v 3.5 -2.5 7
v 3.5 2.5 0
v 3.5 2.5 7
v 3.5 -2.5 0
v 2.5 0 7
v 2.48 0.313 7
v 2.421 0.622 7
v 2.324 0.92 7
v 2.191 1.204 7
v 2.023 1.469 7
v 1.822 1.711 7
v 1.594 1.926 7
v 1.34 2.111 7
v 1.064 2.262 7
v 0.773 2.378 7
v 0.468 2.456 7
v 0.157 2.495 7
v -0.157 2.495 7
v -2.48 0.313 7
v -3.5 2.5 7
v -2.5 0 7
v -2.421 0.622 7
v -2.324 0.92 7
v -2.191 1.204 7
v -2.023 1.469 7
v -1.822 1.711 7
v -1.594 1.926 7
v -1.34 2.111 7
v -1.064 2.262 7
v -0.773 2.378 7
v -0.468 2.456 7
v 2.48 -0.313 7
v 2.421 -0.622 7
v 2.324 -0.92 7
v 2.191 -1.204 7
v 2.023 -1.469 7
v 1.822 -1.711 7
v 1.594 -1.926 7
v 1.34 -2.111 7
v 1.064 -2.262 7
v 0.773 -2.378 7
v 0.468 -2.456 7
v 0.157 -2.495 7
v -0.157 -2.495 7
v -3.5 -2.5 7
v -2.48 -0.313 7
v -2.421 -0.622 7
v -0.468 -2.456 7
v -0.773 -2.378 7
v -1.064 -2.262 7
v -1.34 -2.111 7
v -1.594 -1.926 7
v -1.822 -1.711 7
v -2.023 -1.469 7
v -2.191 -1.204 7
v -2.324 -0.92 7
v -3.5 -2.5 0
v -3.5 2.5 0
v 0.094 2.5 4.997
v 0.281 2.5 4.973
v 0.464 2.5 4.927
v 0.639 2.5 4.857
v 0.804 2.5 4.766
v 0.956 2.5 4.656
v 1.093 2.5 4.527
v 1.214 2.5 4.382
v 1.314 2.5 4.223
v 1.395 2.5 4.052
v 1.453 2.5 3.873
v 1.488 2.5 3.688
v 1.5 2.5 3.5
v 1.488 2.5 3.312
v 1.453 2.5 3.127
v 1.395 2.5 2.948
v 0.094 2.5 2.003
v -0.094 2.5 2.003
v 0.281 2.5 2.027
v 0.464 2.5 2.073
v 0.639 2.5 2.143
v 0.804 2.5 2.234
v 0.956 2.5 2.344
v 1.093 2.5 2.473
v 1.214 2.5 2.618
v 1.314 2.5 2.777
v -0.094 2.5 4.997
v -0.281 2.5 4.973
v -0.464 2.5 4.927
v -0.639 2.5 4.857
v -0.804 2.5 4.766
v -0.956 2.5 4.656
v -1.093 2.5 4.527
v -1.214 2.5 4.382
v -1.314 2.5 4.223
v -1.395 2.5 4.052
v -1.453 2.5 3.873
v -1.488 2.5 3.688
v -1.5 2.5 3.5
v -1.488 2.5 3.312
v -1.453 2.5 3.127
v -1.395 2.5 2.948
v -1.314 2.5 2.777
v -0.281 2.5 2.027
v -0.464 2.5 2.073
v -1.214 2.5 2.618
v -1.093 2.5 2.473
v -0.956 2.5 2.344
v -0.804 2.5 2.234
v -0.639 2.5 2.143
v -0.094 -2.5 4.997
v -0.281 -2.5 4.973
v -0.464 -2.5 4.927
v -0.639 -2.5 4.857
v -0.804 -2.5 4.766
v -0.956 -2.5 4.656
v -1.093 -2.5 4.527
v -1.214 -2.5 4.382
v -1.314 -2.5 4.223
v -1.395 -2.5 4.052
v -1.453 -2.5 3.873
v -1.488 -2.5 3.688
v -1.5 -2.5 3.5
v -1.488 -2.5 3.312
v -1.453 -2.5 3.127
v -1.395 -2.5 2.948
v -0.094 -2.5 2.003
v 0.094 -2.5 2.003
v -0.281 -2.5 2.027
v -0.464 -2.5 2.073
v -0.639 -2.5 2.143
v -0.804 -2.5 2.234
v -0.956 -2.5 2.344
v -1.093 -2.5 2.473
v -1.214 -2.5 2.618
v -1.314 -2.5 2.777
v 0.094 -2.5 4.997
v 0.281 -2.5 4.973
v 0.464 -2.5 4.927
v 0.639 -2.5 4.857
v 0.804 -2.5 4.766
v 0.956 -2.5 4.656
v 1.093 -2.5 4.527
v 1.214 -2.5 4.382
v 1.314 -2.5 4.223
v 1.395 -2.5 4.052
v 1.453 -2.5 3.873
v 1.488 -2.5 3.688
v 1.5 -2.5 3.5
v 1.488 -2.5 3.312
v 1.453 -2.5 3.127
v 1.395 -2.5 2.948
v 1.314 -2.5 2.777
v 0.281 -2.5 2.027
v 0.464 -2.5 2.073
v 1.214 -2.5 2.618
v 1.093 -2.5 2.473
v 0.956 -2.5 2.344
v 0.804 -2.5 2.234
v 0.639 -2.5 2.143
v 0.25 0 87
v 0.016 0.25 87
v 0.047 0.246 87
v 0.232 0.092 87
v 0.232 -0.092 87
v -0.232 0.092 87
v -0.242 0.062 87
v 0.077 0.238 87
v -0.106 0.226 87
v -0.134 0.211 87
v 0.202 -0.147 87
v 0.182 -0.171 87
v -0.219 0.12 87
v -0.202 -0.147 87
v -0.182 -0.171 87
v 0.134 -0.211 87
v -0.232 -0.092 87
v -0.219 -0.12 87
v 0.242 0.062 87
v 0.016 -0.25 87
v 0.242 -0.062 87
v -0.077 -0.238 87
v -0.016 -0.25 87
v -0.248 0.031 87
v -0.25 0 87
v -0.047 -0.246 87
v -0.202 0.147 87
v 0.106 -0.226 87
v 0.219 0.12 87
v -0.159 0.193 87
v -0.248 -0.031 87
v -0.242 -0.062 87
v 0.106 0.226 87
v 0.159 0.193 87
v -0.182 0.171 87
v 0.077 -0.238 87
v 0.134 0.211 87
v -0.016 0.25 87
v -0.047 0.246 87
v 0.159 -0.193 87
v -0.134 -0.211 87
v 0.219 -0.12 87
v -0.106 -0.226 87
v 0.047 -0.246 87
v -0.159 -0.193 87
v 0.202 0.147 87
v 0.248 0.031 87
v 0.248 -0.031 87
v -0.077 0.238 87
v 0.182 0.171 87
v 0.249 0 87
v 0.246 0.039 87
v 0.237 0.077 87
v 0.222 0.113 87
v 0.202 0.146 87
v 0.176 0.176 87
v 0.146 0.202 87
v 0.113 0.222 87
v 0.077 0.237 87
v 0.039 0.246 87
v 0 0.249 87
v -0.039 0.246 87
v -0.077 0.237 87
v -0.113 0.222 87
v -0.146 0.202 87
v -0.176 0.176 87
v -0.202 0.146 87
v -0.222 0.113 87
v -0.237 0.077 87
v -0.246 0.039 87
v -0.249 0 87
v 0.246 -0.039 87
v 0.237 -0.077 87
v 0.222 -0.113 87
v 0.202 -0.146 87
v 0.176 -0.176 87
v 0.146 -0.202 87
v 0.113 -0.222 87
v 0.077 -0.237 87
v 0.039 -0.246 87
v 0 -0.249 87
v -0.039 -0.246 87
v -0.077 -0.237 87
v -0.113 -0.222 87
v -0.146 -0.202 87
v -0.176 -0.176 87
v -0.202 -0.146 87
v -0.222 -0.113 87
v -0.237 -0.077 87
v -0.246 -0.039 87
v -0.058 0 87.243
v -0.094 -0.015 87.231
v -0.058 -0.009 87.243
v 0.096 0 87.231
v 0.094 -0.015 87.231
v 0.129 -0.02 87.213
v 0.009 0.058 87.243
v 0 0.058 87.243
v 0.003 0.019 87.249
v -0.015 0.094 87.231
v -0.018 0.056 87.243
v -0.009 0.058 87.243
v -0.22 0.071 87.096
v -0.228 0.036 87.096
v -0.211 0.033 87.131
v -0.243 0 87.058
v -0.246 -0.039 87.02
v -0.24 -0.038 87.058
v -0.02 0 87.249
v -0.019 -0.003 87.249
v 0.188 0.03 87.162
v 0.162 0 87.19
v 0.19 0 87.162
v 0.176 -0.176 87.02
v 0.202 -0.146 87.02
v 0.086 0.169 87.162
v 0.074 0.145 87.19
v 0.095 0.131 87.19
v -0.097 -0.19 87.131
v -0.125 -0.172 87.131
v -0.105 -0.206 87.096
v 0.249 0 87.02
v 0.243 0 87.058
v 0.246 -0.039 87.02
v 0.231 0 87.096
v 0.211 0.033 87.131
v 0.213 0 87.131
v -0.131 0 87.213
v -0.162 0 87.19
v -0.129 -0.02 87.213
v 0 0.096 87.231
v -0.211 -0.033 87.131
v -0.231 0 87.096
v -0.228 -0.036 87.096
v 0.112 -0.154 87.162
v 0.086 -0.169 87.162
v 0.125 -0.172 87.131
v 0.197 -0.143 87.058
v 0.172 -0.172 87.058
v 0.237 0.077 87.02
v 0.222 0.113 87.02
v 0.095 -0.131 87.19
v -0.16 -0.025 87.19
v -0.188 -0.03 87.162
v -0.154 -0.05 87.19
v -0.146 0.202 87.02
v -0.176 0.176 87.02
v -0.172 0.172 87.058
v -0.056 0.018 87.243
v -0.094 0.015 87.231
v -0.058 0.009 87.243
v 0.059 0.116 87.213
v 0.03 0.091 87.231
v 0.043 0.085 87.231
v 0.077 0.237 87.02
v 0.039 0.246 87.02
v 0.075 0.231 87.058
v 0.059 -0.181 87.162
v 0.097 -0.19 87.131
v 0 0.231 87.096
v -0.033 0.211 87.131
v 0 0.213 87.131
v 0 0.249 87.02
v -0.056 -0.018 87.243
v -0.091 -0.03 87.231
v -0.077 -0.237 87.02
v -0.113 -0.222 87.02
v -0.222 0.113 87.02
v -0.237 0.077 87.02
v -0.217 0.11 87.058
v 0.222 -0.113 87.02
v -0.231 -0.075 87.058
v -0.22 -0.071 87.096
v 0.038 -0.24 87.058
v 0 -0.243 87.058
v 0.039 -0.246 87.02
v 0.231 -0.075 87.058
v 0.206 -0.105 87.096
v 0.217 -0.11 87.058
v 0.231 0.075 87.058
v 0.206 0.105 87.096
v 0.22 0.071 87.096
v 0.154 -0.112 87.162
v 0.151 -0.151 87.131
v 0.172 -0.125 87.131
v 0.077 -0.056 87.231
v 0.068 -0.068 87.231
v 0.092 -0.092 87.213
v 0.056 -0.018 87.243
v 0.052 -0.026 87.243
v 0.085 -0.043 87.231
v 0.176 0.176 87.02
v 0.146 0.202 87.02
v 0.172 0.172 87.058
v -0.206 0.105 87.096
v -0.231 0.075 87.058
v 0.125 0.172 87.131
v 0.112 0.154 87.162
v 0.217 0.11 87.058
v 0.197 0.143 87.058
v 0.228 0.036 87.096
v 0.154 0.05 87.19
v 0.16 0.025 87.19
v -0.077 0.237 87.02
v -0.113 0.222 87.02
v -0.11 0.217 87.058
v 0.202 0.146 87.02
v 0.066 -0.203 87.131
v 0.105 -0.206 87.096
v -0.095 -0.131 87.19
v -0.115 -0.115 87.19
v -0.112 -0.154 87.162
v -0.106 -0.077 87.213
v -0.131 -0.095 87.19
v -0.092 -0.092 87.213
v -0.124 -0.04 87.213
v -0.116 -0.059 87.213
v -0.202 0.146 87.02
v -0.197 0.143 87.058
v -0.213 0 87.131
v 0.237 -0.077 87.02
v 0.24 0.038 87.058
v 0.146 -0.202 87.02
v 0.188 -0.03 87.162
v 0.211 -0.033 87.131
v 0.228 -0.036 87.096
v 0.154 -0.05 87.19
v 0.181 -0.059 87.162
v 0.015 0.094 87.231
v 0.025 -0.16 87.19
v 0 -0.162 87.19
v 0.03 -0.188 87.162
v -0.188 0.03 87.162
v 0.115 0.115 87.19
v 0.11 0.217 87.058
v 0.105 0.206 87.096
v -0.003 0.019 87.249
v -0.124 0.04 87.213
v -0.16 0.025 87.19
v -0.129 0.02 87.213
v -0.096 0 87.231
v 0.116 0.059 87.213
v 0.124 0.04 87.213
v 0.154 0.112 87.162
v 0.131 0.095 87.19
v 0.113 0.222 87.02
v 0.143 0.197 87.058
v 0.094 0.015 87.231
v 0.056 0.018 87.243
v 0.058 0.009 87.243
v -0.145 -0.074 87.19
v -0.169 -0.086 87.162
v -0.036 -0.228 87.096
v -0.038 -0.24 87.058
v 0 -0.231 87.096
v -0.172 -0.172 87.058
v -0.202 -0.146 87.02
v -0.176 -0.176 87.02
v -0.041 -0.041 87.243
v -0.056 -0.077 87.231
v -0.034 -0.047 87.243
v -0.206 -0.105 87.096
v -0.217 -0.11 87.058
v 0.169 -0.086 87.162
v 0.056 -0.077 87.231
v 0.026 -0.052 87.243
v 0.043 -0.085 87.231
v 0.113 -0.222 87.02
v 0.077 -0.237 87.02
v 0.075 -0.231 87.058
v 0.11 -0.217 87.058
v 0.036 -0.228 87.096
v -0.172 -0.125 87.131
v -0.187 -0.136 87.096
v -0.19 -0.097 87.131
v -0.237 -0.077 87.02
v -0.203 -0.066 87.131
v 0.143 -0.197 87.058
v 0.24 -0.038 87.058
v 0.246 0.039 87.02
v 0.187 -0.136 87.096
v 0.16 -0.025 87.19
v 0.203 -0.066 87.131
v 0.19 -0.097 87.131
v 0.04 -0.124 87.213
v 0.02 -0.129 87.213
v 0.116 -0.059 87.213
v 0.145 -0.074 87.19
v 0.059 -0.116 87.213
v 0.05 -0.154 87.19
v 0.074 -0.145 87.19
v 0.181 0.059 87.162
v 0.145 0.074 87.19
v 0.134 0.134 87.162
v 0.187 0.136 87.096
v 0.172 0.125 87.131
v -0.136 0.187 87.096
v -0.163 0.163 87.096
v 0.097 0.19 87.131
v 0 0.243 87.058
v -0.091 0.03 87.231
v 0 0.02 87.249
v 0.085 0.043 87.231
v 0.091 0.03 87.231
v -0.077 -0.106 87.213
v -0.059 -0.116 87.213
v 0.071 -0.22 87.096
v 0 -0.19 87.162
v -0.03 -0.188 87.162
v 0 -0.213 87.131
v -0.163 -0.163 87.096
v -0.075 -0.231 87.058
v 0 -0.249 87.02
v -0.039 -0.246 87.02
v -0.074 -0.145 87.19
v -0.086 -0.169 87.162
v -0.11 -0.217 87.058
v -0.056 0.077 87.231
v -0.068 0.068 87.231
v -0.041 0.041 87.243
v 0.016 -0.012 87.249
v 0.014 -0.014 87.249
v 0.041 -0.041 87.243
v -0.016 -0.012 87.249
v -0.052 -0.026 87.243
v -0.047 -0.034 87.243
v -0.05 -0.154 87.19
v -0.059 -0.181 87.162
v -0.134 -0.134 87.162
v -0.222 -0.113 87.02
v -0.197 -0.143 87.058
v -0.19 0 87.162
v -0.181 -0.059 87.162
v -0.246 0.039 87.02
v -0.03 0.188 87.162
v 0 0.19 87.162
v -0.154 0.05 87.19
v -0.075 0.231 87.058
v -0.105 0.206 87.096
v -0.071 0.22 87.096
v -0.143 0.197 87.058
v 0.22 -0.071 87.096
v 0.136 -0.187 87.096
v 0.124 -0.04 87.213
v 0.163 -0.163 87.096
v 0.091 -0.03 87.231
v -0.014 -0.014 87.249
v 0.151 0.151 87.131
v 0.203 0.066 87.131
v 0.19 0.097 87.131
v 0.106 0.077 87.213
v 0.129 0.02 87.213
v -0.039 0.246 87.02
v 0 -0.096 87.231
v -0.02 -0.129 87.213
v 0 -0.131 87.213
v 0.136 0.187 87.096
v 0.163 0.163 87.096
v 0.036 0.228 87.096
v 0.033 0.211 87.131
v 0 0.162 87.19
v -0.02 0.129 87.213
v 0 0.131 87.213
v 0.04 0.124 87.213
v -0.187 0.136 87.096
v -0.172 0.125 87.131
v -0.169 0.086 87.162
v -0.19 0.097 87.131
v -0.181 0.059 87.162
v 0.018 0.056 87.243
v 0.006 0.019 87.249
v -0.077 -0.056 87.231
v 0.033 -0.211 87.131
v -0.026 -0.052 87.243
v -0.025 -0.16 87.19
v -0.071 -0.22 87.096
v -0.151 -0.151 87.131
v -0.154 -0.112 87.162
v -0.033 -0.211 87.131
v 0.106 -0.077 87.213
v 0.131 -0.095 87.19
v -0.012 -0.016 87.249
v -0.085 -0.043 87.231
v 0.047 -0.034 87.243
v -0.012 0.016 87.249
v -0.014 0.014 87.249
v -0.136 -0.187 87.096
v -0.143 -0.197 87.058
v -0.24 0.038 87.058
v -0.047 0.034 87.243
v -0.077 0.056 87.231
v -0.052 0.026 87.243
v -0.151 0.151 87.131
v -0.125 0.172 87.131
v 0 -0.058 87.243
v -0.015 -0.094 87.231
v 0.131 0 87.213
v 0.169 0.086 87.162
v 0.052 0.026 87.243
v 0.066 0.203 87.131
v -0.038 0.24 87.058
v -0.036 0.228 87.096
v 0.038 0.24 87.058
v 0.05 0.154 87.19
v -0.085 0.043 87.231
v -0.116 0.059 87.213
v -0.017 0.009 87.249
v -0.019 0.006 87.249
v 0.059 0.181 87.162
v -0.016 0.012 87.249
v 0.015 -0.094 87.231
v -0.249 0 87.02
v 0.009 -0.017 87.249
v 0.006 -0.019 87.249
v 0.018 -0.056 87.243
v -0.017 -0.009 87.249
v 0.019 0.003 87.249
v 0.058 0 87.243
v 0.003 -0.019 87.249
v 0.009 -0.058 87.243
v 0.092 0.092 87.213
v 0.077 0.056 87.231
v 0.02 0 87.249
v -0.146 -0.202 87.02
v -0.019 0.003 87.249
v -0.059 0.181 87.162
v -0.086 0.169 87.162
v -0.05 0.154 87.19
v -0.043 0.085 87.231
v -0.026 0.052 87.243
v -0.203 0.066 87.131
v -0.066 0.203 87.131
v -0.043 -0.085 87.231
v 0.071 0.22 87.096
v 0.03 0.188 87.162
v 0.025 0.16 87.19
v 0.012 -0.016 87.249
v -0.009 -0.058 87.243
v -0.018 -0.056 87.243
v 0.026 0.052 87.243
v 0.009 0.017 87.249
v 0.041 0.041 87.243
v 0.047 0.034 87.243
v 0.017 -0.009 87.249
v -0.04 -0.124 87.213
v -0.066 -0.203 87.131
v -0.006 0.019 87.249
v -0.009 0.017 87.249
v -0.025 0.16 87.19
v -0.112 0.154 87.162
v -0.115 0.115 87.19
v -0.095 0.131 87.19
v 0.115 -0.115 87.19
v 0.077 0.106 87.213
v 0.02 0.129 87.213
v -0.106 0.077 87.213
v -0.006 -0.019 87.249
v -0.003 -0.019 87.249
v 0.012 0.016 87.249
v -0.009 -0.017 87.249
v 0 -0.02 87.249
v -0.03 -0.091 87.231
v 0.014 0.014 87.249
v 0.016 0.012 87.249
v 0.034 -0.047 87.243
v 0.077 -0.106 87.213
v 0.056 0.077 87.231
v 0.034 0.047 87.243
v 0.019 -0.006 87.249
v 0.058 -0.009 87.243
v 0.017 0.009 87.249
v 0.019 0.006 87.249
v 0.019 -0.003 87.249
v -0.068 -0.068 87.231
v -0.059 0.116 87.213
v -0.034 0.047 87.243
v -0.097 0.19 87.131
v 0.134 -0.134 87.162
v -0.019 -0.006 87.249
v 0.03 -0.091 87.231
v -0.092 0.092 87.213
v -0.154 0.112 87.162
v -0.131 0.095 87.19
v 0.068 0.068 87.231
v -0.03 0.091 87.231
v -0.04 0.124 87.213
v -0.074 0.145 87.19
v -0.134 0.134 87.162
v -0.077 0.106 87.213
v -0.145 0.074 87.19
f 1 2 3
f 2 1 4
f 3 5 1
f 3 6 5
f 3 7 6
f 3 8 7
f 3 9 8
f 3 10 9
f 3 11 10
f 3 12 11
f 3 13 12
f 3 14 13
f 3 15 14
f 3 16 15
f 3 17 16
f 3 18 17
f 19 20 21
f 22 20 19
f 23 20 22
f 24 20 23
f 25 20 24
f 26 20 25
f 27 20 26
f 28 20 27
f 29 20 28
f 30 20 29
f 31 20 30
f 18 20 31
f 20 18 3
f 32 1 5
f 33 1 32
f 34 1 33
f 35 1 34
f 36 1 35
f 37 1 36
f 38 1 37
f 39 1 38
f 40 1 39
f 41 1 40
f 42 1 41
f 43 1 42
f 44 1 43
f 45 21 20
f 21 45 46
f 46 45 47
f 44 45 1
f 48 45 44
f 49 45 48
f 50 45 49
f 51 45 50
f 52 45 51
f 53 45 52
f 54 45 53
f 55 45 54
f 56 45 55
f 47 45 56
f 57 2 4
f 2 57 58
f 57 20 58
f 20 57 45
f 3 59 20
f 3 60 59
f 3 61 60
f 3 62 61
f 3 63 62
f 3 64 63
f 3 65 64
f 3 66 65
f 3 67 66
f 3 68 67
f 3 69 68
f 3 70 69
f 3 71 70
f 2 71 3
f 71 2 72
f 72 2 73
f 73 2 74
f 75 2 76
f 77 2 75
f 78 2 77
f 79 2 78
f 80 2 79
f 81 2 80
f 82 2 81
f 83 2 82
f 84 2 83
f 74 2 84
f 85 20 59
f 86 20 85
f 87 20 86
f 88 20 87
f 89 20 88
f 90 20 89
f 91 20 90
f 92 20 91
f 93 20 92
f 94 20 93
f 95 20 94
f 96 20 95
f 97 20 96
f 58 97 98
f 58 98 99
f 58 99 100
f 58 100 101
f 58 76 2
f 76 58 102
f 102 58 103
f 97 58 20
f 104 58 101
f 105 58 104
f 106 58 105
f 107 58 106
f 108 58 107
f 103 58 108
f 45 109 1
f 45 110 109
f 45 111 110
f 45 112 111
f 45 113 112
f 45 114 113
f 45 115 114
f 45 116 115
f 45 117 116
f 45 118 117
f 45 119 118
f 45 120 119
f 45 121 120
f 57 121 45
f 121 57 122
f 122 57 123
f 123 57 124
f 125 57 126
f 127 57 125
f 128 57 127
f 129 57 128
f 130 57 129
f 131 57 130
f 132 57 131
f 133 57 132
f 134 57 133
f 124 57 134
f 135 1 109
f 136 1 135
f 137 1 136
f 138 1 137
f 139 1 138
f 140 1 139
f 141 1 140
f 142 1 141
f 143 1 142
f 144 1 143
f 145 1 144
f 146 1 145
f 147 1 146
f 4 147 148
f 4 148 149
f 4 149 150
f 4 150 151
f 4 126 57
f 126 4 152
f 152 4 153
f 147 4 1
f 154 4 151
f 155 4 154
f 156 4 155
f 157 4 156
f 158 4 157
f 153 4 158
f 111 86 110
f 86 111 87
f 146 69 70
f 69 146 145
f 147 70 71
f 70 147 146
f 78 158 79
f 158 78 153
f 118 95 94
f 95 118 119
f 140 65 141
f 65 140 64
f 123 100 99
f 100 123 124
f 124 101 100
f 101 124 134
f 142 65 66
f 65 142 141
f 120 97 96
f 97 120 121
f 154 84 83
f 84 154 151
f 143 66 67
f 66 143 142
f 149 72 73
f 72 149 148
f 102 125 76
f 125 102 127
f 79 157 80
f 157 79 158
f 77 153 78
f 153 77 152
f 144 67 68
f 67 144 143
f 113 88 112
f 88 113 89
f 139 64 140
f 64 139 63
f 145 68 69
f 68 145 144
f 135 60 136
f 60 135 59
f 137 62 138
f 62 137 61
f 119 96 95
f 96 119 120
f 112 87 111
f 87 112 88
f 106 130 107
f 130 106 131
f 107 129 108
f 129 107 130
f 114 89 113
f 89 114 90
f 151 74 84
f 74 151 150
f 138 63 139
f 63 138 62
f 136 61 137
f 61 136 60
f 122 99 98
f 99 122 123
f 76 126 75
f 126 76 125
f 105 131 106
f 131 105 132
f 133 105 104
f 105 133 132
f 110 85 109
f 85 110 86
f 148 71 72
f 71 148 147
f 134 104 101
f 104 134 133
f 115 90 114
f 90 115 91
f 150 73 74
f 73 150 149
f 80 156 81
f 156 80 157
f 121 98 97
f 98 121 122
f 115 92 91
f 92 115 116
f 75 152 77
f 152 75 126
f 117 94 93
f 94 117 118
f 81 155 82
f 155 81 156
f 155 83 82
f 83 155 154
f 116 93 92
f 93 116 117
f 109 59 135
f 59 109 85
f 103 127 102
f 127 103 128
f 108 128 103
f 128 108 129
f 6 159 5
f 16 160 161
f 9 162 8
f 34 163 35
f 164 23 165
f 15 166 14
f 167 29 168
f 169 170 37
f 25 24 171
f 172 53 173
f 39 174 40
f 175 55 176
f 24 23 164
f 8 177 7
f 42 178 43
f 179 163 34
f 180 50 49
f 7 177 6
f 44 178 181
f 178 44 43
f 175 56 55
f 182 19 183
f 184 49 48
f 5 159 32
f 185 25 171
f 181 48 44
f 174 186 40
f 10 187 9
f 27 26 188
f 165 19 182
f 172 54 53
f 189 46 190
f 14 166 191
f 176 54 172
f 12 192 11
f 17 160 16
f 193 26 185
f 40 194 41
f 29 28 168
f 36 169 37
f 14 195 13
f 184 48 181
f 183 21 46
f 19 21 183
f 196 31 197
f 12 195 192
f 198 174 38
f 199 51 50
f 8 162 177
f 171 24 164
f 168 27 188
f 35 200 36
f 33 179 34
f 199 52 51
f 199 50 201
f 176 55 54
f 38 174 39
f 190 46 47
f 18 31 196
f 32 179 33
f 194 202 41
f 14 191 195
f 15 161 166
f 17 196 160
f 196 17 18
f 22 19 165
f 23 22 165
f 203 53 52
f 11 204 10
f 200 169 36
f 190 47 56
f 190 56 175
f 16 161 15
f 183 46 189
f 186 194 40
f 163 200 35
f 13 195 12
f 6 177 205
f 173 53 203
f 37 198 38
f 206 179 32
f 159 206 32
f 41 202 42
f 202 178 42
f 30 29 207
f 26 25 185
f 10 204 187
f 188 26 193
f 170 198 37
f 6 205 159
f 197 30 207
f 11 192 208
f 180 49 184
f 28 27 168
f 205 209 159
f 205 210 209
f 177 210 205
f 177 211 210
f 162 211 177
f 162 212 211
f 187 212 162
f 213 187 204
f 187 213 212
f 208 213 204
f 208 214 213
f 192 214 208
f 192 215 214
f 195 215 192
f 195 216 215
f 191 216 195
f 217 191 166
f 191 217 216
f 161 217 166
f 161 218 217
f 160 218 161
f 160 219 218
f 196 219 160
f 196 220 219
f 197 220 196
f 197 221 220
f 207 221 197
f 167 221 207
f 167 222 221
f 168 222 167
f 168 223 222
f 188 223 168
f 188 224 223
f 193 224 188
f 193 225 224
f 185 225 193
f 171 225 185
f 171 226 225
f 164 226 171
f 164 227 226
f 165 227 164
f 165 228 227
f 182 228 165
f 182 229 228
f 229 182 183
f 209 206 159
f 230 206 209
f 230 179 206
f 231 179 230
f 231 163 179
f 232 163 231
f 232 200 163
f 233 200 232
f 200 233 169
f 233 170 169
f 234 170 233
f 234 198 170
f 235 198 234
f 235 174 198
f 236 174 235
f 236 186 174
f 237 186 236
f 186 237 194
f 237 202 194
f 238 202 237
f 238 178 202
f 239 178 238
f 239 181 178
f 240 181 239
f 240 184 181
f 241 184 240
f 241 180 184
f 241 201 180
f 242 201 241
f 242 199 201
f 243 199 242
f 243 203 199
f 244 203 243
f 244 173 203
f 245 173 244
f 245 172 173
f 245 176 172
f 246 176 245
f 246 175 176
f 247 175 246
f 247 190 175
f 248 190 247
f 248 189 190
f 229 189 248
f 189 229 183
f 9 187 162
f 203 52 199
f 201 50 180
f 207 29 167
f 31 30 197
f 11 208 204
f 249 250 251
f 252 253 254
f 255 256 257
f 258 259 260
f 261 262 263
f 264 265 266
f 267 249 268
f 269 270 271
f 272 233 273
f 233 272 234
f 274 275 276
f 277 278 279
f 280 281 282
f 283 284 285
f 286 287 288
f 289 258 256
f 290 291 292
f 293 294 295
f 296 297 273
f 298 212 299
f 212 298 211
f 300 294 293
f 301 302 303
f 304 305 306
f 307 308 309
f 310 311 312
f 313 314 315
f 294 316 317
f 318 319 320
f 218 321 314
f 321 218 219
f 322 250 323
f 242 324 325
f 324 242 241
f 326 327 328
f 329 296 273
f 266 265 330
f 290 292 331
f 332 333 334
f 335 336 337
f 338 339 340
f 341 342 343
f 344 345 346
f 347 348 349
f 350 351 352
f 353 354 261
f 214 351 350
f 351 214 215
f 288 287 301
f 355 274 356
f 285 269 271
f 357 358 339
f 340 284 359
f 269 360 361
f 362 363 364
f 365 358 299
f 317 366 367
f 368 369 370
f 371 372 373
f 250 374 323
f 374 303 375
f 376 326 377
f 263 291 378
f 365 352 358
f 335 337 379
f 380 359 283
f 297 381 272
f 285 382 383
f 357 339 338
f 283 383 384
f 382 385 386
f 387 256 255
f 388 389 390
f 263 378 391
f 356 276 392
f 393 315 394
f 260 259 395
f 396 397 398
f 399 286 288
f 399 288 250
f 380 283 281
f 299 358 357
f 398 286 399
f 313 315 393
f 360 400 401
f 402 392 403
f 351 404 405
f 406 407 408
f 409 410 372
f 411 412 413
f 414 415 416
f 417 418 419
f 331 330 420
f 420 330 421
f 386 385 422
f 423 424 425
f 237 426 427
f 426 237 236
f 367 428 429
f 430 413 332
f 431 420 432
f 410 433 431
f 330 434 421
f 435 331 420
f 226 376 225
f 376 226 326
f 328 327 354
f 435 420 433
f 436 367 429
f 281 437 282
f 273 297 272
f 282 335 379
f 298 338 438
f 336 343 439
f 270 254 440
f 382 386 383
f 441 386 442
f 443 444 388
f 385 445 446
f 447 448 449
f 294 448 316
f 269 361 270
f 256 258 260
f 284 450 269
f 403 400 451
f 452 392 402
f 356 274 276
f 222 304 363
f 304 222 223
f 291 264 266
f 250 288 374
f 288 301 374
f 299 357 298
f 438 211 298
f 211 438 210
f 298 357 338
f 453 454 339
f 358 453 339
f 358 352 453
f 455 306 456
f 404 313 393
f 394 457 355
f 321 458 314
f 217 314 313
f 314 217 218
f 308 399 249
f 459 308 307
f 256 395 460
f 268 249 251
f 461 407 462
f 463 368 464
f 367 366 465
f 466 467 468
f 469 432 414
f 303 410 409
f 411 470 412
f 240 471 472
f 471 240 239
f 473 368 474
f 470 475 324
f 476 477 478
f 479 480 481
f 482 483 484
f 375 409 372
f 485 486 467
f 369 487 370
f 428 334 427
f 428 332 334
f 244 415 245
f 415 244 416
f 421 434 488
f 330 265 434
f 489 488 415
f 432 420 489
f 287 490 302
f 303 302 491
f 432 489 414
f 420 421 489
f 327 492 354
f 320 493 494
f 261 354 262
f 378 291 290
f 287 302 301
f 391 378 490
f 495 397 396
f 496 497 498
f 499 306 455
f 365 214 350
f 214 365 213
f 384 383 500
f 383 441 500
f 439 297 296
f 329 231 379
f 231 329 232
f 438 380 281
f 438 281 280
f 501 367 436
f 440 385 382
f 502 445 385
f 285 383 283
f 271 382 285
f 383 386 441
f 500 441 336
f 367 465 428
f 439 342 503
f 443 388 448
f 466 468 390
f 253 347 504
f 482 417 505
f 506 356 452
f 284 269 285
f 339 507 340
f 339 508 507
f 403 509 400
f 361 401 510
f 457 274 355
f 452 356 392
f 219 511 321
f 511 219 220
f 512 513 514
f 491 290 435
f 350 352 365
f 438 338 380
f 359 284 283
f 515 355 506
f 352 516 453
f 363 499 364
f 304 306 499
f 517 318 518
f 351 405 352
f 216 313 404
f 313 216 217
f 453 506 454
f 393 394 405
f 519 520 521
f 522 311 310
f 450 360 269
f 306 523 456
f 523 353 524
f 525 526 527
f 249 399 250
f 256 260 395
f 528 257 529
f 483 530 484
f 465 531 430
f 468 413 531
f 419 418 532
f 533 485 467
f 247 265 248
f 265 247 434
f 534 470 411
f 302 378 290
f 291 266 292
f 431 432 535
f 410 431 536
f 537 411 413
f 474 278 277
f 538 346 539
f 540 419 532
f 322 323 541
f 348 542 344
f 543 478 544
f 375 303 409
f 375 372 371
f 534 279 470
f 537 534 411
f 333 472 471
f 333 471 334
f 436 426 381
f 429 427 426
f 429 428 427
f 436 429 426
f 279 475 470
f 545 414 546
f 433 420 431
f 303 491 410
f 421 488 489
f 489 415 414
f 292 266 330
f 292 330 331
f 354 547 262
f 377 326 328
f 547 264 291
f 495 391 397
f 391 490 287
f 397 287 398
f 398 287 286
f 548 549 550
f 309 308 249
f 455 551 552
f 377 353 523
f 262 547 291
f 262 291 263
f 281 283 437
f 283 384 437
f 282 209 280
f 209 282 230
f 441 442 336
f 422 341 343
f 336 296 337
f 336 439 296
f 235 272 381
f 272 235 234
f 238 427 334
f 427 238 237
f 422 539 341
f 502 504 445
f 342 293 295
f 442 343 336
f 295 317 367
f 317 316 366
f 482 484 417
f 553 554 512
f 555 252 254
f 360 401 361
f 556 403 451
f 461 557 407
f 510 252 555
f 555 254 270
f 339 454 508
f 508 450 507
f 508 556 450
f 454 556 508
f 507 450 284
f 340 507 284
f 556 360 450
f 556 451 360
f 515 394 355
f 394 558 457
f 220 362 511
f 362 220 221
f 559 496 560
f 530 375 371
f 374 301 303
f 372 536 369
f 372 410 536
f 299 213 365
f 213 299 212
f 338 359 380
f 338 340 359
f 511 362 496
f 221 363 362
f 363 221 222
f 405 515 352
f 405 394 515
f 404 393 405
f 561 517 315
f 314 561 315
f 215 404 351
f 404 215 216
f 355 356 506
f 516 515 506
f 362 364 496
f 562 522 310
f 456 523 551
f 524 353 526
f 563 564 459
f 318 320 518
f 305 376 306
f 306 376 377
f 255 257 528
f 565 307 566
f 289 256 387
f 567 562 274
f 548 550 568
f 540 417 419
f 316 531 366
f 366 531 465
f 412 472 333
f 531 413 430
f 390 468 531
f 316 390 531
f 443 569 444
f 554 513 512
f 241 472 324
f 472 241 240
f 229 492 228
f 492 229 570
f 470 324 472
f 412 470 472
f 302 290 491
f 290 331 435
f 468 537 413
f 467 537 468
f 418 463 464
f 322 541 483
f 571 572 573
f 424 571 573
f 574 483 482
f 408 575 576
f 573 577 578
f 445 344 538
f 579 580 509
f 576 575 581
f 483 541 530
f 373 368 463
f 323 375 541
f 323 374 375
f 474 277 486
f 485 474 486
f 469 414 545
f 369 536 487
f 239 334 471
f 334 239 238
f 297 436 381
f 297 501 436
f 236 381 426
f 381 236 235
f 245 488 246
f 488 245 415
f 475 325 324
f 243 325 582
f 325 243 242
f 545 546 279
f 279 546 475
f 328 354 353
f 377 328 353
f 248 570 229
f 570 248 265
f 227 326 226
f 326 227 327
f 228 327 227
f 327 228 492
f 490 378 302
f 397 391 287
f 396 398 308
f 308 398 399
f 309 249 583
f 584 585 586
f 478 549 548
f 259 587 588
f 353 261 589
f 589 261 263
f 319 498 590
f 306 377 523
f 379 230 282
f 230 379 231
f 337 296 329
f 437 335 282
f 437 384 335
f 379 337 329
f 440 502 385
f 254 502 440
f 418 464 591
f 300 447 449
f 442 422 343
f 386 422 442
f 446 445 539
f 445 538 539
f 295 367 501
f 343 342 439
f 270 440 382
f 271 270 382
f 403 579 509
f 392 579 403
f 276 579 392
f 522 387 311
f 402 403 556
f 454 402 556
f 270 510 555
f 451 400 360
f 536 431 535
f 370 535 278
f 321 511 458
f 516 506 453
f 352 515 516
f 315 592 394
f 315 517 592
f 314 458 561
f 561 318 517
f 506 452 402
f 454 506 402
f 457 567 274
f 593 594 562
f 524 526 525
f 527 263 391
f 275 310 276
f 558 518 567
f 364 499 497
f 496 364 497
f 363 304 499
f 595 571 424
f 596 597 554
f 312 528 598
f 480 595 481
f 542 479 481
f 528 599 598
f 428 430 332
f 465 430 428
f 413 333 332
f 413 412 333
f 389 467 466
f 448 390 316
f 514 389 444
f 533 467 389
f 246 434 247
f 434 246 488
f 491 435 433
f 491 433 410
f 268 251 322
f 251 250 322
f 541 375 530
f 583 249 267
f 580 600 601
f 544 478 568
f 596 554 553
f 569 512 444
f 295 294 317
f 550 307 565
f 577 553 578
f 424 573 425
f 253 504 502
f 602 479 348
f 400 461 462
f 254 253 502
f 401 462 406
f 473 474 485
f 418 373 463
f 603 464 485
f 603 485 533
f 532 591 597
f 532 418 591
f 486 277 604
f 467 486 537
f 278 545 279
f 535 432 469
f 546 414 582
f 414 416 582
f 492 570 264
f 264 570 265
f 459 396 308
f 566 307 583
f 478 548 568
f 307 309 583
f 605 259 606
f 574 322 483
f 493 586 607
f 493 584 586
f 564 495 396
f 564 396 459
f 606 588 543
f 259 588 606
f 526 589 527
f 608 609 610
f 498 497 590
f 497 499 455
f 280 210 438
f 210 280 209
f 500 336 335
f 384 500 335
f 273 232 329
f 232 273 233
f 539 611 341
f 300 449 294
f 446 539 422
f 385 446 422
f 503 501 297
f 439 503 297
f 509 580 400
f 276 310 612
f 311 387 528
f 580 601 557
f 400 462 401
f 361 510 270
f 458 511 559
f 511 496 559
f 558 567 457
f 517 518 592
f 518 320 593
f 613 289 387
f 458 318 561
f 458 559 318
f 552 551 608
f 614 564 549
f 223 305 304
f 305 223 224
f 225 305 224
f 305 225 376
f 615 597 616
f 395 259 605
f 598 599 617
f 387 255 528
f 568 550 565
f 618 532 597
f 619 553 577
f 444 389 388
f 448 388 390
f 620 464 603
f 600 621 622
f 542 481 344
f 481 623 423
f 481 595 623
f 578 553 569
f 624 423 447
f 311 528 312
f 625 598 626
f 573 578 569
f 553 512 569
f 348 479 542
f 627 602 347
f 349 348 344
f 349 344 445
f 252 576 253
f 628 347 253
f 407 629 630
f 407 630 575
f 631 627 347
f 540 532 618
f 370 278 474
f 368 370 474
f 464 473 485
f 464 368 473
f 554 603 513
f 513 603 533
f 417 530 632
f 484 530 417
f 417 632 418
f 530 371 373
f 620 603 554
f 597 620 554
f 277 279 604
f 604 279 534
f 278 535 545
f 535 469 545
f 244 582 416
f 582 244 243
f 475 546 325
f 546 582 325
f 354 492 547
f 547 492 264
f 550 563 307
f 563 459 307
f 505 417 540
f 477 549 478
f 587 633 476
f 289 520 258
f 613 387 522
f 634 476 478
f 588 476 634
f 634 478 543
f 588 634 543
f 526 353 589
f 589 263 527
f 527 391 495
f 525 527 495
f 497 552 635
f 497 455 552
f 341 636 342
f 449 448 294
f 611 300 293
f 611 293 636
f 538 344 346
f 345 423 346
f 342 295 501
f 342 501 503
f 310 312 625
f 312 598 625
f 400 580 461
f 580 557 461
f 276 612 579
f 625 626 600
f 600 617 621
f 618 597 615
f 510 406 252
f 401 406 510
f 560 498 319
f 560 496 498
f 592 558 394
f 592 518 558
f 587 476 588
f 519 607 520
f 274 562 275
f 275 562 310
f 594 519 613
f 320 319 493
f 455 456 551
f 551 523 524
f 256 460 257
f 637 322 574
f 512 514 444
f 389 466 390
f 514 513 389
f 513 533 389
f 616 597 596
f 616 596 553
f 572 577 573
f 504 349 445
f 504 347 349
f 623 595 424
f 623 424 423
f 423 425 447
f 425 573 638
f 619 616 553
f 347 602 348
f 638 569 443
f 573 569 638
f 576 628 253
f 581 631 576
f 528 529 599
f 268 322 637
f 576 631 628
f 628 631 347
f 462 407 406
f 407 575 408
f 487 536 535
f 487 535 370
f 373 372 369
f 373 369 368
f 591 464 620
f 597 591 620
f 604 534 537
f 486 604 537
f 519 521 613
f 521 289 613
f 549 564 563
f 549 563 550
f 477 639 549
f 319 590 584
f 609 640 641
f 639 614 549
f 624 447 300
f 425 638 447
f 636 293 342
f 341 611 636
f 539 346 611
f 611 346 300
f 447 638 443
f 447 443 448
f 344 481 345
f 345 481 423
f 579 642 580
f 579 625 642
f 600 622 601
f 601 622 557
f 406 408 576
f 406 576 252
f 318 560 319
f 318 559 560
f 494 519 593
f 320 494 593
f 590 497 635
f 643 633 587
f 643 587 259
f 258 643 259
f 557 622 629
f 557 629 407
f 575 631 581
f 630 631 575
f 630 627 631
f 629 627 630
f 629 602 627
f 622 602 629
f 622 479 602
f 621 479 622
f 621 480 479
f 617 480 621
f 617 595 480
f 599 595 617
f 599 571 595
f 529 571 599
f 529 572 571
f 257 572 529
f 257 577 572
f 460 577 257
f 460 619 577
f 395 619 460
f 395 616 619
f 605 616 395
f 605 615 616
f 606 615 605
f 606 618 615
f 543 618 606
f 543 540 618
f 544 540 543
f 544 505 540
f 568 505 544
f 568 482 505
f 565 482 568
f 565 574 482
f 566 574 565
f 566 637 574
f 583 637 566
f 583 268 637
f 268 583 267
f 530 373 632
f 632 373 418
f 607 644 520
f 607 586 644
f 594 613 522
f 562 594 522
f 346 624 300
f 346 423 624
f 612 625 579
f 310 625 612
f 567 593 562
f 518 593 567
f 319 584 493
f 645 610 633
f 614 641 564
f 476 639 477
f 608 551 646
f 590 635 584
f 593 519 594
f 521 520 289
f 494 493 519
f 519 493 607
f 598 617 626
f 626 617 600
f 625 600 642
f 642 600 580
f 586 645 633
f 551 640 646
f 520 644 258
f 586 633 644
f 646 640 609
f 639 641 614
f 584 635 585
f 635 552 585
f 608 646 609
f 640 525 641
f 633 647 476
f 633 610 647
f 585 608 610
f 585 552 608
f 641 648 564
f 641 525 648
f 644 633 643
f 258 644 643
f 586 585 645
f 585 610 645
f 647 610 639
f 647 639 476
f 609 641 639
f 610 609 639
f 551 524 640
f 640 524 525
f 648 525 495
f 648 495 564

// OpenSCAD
HEIGHT   = 80; // in mm
TUBE_DIA =  3; // outer diameter of tube in mm

MARGIN = 2;
translate([0, 0, TUBE_DIA+2*MARGIN])
   cylinder(d1=5, d2=0.5, h=HEIGHT, $fn=50);

translate([0, 0, TUBE_DIA+2*MARGIN+HEIGHT])   
   sphere(d=0.5, $fn=40);

difference() {
   translate([0, 0, (TUBE_DIA+2*MARGIN)/2])
      cube([TUBE_DIA+2*MARGIN, 5, TUBE_DIA+2*MARGIN], true);
   translate([0, 0, TUBE_DIA/2+MARGIN])      
      rotate([90, 0, 0])
         translate([0, 0, -50])      
            cylinder(d=TUBE_DIA, h=100, $fn=50);
}
